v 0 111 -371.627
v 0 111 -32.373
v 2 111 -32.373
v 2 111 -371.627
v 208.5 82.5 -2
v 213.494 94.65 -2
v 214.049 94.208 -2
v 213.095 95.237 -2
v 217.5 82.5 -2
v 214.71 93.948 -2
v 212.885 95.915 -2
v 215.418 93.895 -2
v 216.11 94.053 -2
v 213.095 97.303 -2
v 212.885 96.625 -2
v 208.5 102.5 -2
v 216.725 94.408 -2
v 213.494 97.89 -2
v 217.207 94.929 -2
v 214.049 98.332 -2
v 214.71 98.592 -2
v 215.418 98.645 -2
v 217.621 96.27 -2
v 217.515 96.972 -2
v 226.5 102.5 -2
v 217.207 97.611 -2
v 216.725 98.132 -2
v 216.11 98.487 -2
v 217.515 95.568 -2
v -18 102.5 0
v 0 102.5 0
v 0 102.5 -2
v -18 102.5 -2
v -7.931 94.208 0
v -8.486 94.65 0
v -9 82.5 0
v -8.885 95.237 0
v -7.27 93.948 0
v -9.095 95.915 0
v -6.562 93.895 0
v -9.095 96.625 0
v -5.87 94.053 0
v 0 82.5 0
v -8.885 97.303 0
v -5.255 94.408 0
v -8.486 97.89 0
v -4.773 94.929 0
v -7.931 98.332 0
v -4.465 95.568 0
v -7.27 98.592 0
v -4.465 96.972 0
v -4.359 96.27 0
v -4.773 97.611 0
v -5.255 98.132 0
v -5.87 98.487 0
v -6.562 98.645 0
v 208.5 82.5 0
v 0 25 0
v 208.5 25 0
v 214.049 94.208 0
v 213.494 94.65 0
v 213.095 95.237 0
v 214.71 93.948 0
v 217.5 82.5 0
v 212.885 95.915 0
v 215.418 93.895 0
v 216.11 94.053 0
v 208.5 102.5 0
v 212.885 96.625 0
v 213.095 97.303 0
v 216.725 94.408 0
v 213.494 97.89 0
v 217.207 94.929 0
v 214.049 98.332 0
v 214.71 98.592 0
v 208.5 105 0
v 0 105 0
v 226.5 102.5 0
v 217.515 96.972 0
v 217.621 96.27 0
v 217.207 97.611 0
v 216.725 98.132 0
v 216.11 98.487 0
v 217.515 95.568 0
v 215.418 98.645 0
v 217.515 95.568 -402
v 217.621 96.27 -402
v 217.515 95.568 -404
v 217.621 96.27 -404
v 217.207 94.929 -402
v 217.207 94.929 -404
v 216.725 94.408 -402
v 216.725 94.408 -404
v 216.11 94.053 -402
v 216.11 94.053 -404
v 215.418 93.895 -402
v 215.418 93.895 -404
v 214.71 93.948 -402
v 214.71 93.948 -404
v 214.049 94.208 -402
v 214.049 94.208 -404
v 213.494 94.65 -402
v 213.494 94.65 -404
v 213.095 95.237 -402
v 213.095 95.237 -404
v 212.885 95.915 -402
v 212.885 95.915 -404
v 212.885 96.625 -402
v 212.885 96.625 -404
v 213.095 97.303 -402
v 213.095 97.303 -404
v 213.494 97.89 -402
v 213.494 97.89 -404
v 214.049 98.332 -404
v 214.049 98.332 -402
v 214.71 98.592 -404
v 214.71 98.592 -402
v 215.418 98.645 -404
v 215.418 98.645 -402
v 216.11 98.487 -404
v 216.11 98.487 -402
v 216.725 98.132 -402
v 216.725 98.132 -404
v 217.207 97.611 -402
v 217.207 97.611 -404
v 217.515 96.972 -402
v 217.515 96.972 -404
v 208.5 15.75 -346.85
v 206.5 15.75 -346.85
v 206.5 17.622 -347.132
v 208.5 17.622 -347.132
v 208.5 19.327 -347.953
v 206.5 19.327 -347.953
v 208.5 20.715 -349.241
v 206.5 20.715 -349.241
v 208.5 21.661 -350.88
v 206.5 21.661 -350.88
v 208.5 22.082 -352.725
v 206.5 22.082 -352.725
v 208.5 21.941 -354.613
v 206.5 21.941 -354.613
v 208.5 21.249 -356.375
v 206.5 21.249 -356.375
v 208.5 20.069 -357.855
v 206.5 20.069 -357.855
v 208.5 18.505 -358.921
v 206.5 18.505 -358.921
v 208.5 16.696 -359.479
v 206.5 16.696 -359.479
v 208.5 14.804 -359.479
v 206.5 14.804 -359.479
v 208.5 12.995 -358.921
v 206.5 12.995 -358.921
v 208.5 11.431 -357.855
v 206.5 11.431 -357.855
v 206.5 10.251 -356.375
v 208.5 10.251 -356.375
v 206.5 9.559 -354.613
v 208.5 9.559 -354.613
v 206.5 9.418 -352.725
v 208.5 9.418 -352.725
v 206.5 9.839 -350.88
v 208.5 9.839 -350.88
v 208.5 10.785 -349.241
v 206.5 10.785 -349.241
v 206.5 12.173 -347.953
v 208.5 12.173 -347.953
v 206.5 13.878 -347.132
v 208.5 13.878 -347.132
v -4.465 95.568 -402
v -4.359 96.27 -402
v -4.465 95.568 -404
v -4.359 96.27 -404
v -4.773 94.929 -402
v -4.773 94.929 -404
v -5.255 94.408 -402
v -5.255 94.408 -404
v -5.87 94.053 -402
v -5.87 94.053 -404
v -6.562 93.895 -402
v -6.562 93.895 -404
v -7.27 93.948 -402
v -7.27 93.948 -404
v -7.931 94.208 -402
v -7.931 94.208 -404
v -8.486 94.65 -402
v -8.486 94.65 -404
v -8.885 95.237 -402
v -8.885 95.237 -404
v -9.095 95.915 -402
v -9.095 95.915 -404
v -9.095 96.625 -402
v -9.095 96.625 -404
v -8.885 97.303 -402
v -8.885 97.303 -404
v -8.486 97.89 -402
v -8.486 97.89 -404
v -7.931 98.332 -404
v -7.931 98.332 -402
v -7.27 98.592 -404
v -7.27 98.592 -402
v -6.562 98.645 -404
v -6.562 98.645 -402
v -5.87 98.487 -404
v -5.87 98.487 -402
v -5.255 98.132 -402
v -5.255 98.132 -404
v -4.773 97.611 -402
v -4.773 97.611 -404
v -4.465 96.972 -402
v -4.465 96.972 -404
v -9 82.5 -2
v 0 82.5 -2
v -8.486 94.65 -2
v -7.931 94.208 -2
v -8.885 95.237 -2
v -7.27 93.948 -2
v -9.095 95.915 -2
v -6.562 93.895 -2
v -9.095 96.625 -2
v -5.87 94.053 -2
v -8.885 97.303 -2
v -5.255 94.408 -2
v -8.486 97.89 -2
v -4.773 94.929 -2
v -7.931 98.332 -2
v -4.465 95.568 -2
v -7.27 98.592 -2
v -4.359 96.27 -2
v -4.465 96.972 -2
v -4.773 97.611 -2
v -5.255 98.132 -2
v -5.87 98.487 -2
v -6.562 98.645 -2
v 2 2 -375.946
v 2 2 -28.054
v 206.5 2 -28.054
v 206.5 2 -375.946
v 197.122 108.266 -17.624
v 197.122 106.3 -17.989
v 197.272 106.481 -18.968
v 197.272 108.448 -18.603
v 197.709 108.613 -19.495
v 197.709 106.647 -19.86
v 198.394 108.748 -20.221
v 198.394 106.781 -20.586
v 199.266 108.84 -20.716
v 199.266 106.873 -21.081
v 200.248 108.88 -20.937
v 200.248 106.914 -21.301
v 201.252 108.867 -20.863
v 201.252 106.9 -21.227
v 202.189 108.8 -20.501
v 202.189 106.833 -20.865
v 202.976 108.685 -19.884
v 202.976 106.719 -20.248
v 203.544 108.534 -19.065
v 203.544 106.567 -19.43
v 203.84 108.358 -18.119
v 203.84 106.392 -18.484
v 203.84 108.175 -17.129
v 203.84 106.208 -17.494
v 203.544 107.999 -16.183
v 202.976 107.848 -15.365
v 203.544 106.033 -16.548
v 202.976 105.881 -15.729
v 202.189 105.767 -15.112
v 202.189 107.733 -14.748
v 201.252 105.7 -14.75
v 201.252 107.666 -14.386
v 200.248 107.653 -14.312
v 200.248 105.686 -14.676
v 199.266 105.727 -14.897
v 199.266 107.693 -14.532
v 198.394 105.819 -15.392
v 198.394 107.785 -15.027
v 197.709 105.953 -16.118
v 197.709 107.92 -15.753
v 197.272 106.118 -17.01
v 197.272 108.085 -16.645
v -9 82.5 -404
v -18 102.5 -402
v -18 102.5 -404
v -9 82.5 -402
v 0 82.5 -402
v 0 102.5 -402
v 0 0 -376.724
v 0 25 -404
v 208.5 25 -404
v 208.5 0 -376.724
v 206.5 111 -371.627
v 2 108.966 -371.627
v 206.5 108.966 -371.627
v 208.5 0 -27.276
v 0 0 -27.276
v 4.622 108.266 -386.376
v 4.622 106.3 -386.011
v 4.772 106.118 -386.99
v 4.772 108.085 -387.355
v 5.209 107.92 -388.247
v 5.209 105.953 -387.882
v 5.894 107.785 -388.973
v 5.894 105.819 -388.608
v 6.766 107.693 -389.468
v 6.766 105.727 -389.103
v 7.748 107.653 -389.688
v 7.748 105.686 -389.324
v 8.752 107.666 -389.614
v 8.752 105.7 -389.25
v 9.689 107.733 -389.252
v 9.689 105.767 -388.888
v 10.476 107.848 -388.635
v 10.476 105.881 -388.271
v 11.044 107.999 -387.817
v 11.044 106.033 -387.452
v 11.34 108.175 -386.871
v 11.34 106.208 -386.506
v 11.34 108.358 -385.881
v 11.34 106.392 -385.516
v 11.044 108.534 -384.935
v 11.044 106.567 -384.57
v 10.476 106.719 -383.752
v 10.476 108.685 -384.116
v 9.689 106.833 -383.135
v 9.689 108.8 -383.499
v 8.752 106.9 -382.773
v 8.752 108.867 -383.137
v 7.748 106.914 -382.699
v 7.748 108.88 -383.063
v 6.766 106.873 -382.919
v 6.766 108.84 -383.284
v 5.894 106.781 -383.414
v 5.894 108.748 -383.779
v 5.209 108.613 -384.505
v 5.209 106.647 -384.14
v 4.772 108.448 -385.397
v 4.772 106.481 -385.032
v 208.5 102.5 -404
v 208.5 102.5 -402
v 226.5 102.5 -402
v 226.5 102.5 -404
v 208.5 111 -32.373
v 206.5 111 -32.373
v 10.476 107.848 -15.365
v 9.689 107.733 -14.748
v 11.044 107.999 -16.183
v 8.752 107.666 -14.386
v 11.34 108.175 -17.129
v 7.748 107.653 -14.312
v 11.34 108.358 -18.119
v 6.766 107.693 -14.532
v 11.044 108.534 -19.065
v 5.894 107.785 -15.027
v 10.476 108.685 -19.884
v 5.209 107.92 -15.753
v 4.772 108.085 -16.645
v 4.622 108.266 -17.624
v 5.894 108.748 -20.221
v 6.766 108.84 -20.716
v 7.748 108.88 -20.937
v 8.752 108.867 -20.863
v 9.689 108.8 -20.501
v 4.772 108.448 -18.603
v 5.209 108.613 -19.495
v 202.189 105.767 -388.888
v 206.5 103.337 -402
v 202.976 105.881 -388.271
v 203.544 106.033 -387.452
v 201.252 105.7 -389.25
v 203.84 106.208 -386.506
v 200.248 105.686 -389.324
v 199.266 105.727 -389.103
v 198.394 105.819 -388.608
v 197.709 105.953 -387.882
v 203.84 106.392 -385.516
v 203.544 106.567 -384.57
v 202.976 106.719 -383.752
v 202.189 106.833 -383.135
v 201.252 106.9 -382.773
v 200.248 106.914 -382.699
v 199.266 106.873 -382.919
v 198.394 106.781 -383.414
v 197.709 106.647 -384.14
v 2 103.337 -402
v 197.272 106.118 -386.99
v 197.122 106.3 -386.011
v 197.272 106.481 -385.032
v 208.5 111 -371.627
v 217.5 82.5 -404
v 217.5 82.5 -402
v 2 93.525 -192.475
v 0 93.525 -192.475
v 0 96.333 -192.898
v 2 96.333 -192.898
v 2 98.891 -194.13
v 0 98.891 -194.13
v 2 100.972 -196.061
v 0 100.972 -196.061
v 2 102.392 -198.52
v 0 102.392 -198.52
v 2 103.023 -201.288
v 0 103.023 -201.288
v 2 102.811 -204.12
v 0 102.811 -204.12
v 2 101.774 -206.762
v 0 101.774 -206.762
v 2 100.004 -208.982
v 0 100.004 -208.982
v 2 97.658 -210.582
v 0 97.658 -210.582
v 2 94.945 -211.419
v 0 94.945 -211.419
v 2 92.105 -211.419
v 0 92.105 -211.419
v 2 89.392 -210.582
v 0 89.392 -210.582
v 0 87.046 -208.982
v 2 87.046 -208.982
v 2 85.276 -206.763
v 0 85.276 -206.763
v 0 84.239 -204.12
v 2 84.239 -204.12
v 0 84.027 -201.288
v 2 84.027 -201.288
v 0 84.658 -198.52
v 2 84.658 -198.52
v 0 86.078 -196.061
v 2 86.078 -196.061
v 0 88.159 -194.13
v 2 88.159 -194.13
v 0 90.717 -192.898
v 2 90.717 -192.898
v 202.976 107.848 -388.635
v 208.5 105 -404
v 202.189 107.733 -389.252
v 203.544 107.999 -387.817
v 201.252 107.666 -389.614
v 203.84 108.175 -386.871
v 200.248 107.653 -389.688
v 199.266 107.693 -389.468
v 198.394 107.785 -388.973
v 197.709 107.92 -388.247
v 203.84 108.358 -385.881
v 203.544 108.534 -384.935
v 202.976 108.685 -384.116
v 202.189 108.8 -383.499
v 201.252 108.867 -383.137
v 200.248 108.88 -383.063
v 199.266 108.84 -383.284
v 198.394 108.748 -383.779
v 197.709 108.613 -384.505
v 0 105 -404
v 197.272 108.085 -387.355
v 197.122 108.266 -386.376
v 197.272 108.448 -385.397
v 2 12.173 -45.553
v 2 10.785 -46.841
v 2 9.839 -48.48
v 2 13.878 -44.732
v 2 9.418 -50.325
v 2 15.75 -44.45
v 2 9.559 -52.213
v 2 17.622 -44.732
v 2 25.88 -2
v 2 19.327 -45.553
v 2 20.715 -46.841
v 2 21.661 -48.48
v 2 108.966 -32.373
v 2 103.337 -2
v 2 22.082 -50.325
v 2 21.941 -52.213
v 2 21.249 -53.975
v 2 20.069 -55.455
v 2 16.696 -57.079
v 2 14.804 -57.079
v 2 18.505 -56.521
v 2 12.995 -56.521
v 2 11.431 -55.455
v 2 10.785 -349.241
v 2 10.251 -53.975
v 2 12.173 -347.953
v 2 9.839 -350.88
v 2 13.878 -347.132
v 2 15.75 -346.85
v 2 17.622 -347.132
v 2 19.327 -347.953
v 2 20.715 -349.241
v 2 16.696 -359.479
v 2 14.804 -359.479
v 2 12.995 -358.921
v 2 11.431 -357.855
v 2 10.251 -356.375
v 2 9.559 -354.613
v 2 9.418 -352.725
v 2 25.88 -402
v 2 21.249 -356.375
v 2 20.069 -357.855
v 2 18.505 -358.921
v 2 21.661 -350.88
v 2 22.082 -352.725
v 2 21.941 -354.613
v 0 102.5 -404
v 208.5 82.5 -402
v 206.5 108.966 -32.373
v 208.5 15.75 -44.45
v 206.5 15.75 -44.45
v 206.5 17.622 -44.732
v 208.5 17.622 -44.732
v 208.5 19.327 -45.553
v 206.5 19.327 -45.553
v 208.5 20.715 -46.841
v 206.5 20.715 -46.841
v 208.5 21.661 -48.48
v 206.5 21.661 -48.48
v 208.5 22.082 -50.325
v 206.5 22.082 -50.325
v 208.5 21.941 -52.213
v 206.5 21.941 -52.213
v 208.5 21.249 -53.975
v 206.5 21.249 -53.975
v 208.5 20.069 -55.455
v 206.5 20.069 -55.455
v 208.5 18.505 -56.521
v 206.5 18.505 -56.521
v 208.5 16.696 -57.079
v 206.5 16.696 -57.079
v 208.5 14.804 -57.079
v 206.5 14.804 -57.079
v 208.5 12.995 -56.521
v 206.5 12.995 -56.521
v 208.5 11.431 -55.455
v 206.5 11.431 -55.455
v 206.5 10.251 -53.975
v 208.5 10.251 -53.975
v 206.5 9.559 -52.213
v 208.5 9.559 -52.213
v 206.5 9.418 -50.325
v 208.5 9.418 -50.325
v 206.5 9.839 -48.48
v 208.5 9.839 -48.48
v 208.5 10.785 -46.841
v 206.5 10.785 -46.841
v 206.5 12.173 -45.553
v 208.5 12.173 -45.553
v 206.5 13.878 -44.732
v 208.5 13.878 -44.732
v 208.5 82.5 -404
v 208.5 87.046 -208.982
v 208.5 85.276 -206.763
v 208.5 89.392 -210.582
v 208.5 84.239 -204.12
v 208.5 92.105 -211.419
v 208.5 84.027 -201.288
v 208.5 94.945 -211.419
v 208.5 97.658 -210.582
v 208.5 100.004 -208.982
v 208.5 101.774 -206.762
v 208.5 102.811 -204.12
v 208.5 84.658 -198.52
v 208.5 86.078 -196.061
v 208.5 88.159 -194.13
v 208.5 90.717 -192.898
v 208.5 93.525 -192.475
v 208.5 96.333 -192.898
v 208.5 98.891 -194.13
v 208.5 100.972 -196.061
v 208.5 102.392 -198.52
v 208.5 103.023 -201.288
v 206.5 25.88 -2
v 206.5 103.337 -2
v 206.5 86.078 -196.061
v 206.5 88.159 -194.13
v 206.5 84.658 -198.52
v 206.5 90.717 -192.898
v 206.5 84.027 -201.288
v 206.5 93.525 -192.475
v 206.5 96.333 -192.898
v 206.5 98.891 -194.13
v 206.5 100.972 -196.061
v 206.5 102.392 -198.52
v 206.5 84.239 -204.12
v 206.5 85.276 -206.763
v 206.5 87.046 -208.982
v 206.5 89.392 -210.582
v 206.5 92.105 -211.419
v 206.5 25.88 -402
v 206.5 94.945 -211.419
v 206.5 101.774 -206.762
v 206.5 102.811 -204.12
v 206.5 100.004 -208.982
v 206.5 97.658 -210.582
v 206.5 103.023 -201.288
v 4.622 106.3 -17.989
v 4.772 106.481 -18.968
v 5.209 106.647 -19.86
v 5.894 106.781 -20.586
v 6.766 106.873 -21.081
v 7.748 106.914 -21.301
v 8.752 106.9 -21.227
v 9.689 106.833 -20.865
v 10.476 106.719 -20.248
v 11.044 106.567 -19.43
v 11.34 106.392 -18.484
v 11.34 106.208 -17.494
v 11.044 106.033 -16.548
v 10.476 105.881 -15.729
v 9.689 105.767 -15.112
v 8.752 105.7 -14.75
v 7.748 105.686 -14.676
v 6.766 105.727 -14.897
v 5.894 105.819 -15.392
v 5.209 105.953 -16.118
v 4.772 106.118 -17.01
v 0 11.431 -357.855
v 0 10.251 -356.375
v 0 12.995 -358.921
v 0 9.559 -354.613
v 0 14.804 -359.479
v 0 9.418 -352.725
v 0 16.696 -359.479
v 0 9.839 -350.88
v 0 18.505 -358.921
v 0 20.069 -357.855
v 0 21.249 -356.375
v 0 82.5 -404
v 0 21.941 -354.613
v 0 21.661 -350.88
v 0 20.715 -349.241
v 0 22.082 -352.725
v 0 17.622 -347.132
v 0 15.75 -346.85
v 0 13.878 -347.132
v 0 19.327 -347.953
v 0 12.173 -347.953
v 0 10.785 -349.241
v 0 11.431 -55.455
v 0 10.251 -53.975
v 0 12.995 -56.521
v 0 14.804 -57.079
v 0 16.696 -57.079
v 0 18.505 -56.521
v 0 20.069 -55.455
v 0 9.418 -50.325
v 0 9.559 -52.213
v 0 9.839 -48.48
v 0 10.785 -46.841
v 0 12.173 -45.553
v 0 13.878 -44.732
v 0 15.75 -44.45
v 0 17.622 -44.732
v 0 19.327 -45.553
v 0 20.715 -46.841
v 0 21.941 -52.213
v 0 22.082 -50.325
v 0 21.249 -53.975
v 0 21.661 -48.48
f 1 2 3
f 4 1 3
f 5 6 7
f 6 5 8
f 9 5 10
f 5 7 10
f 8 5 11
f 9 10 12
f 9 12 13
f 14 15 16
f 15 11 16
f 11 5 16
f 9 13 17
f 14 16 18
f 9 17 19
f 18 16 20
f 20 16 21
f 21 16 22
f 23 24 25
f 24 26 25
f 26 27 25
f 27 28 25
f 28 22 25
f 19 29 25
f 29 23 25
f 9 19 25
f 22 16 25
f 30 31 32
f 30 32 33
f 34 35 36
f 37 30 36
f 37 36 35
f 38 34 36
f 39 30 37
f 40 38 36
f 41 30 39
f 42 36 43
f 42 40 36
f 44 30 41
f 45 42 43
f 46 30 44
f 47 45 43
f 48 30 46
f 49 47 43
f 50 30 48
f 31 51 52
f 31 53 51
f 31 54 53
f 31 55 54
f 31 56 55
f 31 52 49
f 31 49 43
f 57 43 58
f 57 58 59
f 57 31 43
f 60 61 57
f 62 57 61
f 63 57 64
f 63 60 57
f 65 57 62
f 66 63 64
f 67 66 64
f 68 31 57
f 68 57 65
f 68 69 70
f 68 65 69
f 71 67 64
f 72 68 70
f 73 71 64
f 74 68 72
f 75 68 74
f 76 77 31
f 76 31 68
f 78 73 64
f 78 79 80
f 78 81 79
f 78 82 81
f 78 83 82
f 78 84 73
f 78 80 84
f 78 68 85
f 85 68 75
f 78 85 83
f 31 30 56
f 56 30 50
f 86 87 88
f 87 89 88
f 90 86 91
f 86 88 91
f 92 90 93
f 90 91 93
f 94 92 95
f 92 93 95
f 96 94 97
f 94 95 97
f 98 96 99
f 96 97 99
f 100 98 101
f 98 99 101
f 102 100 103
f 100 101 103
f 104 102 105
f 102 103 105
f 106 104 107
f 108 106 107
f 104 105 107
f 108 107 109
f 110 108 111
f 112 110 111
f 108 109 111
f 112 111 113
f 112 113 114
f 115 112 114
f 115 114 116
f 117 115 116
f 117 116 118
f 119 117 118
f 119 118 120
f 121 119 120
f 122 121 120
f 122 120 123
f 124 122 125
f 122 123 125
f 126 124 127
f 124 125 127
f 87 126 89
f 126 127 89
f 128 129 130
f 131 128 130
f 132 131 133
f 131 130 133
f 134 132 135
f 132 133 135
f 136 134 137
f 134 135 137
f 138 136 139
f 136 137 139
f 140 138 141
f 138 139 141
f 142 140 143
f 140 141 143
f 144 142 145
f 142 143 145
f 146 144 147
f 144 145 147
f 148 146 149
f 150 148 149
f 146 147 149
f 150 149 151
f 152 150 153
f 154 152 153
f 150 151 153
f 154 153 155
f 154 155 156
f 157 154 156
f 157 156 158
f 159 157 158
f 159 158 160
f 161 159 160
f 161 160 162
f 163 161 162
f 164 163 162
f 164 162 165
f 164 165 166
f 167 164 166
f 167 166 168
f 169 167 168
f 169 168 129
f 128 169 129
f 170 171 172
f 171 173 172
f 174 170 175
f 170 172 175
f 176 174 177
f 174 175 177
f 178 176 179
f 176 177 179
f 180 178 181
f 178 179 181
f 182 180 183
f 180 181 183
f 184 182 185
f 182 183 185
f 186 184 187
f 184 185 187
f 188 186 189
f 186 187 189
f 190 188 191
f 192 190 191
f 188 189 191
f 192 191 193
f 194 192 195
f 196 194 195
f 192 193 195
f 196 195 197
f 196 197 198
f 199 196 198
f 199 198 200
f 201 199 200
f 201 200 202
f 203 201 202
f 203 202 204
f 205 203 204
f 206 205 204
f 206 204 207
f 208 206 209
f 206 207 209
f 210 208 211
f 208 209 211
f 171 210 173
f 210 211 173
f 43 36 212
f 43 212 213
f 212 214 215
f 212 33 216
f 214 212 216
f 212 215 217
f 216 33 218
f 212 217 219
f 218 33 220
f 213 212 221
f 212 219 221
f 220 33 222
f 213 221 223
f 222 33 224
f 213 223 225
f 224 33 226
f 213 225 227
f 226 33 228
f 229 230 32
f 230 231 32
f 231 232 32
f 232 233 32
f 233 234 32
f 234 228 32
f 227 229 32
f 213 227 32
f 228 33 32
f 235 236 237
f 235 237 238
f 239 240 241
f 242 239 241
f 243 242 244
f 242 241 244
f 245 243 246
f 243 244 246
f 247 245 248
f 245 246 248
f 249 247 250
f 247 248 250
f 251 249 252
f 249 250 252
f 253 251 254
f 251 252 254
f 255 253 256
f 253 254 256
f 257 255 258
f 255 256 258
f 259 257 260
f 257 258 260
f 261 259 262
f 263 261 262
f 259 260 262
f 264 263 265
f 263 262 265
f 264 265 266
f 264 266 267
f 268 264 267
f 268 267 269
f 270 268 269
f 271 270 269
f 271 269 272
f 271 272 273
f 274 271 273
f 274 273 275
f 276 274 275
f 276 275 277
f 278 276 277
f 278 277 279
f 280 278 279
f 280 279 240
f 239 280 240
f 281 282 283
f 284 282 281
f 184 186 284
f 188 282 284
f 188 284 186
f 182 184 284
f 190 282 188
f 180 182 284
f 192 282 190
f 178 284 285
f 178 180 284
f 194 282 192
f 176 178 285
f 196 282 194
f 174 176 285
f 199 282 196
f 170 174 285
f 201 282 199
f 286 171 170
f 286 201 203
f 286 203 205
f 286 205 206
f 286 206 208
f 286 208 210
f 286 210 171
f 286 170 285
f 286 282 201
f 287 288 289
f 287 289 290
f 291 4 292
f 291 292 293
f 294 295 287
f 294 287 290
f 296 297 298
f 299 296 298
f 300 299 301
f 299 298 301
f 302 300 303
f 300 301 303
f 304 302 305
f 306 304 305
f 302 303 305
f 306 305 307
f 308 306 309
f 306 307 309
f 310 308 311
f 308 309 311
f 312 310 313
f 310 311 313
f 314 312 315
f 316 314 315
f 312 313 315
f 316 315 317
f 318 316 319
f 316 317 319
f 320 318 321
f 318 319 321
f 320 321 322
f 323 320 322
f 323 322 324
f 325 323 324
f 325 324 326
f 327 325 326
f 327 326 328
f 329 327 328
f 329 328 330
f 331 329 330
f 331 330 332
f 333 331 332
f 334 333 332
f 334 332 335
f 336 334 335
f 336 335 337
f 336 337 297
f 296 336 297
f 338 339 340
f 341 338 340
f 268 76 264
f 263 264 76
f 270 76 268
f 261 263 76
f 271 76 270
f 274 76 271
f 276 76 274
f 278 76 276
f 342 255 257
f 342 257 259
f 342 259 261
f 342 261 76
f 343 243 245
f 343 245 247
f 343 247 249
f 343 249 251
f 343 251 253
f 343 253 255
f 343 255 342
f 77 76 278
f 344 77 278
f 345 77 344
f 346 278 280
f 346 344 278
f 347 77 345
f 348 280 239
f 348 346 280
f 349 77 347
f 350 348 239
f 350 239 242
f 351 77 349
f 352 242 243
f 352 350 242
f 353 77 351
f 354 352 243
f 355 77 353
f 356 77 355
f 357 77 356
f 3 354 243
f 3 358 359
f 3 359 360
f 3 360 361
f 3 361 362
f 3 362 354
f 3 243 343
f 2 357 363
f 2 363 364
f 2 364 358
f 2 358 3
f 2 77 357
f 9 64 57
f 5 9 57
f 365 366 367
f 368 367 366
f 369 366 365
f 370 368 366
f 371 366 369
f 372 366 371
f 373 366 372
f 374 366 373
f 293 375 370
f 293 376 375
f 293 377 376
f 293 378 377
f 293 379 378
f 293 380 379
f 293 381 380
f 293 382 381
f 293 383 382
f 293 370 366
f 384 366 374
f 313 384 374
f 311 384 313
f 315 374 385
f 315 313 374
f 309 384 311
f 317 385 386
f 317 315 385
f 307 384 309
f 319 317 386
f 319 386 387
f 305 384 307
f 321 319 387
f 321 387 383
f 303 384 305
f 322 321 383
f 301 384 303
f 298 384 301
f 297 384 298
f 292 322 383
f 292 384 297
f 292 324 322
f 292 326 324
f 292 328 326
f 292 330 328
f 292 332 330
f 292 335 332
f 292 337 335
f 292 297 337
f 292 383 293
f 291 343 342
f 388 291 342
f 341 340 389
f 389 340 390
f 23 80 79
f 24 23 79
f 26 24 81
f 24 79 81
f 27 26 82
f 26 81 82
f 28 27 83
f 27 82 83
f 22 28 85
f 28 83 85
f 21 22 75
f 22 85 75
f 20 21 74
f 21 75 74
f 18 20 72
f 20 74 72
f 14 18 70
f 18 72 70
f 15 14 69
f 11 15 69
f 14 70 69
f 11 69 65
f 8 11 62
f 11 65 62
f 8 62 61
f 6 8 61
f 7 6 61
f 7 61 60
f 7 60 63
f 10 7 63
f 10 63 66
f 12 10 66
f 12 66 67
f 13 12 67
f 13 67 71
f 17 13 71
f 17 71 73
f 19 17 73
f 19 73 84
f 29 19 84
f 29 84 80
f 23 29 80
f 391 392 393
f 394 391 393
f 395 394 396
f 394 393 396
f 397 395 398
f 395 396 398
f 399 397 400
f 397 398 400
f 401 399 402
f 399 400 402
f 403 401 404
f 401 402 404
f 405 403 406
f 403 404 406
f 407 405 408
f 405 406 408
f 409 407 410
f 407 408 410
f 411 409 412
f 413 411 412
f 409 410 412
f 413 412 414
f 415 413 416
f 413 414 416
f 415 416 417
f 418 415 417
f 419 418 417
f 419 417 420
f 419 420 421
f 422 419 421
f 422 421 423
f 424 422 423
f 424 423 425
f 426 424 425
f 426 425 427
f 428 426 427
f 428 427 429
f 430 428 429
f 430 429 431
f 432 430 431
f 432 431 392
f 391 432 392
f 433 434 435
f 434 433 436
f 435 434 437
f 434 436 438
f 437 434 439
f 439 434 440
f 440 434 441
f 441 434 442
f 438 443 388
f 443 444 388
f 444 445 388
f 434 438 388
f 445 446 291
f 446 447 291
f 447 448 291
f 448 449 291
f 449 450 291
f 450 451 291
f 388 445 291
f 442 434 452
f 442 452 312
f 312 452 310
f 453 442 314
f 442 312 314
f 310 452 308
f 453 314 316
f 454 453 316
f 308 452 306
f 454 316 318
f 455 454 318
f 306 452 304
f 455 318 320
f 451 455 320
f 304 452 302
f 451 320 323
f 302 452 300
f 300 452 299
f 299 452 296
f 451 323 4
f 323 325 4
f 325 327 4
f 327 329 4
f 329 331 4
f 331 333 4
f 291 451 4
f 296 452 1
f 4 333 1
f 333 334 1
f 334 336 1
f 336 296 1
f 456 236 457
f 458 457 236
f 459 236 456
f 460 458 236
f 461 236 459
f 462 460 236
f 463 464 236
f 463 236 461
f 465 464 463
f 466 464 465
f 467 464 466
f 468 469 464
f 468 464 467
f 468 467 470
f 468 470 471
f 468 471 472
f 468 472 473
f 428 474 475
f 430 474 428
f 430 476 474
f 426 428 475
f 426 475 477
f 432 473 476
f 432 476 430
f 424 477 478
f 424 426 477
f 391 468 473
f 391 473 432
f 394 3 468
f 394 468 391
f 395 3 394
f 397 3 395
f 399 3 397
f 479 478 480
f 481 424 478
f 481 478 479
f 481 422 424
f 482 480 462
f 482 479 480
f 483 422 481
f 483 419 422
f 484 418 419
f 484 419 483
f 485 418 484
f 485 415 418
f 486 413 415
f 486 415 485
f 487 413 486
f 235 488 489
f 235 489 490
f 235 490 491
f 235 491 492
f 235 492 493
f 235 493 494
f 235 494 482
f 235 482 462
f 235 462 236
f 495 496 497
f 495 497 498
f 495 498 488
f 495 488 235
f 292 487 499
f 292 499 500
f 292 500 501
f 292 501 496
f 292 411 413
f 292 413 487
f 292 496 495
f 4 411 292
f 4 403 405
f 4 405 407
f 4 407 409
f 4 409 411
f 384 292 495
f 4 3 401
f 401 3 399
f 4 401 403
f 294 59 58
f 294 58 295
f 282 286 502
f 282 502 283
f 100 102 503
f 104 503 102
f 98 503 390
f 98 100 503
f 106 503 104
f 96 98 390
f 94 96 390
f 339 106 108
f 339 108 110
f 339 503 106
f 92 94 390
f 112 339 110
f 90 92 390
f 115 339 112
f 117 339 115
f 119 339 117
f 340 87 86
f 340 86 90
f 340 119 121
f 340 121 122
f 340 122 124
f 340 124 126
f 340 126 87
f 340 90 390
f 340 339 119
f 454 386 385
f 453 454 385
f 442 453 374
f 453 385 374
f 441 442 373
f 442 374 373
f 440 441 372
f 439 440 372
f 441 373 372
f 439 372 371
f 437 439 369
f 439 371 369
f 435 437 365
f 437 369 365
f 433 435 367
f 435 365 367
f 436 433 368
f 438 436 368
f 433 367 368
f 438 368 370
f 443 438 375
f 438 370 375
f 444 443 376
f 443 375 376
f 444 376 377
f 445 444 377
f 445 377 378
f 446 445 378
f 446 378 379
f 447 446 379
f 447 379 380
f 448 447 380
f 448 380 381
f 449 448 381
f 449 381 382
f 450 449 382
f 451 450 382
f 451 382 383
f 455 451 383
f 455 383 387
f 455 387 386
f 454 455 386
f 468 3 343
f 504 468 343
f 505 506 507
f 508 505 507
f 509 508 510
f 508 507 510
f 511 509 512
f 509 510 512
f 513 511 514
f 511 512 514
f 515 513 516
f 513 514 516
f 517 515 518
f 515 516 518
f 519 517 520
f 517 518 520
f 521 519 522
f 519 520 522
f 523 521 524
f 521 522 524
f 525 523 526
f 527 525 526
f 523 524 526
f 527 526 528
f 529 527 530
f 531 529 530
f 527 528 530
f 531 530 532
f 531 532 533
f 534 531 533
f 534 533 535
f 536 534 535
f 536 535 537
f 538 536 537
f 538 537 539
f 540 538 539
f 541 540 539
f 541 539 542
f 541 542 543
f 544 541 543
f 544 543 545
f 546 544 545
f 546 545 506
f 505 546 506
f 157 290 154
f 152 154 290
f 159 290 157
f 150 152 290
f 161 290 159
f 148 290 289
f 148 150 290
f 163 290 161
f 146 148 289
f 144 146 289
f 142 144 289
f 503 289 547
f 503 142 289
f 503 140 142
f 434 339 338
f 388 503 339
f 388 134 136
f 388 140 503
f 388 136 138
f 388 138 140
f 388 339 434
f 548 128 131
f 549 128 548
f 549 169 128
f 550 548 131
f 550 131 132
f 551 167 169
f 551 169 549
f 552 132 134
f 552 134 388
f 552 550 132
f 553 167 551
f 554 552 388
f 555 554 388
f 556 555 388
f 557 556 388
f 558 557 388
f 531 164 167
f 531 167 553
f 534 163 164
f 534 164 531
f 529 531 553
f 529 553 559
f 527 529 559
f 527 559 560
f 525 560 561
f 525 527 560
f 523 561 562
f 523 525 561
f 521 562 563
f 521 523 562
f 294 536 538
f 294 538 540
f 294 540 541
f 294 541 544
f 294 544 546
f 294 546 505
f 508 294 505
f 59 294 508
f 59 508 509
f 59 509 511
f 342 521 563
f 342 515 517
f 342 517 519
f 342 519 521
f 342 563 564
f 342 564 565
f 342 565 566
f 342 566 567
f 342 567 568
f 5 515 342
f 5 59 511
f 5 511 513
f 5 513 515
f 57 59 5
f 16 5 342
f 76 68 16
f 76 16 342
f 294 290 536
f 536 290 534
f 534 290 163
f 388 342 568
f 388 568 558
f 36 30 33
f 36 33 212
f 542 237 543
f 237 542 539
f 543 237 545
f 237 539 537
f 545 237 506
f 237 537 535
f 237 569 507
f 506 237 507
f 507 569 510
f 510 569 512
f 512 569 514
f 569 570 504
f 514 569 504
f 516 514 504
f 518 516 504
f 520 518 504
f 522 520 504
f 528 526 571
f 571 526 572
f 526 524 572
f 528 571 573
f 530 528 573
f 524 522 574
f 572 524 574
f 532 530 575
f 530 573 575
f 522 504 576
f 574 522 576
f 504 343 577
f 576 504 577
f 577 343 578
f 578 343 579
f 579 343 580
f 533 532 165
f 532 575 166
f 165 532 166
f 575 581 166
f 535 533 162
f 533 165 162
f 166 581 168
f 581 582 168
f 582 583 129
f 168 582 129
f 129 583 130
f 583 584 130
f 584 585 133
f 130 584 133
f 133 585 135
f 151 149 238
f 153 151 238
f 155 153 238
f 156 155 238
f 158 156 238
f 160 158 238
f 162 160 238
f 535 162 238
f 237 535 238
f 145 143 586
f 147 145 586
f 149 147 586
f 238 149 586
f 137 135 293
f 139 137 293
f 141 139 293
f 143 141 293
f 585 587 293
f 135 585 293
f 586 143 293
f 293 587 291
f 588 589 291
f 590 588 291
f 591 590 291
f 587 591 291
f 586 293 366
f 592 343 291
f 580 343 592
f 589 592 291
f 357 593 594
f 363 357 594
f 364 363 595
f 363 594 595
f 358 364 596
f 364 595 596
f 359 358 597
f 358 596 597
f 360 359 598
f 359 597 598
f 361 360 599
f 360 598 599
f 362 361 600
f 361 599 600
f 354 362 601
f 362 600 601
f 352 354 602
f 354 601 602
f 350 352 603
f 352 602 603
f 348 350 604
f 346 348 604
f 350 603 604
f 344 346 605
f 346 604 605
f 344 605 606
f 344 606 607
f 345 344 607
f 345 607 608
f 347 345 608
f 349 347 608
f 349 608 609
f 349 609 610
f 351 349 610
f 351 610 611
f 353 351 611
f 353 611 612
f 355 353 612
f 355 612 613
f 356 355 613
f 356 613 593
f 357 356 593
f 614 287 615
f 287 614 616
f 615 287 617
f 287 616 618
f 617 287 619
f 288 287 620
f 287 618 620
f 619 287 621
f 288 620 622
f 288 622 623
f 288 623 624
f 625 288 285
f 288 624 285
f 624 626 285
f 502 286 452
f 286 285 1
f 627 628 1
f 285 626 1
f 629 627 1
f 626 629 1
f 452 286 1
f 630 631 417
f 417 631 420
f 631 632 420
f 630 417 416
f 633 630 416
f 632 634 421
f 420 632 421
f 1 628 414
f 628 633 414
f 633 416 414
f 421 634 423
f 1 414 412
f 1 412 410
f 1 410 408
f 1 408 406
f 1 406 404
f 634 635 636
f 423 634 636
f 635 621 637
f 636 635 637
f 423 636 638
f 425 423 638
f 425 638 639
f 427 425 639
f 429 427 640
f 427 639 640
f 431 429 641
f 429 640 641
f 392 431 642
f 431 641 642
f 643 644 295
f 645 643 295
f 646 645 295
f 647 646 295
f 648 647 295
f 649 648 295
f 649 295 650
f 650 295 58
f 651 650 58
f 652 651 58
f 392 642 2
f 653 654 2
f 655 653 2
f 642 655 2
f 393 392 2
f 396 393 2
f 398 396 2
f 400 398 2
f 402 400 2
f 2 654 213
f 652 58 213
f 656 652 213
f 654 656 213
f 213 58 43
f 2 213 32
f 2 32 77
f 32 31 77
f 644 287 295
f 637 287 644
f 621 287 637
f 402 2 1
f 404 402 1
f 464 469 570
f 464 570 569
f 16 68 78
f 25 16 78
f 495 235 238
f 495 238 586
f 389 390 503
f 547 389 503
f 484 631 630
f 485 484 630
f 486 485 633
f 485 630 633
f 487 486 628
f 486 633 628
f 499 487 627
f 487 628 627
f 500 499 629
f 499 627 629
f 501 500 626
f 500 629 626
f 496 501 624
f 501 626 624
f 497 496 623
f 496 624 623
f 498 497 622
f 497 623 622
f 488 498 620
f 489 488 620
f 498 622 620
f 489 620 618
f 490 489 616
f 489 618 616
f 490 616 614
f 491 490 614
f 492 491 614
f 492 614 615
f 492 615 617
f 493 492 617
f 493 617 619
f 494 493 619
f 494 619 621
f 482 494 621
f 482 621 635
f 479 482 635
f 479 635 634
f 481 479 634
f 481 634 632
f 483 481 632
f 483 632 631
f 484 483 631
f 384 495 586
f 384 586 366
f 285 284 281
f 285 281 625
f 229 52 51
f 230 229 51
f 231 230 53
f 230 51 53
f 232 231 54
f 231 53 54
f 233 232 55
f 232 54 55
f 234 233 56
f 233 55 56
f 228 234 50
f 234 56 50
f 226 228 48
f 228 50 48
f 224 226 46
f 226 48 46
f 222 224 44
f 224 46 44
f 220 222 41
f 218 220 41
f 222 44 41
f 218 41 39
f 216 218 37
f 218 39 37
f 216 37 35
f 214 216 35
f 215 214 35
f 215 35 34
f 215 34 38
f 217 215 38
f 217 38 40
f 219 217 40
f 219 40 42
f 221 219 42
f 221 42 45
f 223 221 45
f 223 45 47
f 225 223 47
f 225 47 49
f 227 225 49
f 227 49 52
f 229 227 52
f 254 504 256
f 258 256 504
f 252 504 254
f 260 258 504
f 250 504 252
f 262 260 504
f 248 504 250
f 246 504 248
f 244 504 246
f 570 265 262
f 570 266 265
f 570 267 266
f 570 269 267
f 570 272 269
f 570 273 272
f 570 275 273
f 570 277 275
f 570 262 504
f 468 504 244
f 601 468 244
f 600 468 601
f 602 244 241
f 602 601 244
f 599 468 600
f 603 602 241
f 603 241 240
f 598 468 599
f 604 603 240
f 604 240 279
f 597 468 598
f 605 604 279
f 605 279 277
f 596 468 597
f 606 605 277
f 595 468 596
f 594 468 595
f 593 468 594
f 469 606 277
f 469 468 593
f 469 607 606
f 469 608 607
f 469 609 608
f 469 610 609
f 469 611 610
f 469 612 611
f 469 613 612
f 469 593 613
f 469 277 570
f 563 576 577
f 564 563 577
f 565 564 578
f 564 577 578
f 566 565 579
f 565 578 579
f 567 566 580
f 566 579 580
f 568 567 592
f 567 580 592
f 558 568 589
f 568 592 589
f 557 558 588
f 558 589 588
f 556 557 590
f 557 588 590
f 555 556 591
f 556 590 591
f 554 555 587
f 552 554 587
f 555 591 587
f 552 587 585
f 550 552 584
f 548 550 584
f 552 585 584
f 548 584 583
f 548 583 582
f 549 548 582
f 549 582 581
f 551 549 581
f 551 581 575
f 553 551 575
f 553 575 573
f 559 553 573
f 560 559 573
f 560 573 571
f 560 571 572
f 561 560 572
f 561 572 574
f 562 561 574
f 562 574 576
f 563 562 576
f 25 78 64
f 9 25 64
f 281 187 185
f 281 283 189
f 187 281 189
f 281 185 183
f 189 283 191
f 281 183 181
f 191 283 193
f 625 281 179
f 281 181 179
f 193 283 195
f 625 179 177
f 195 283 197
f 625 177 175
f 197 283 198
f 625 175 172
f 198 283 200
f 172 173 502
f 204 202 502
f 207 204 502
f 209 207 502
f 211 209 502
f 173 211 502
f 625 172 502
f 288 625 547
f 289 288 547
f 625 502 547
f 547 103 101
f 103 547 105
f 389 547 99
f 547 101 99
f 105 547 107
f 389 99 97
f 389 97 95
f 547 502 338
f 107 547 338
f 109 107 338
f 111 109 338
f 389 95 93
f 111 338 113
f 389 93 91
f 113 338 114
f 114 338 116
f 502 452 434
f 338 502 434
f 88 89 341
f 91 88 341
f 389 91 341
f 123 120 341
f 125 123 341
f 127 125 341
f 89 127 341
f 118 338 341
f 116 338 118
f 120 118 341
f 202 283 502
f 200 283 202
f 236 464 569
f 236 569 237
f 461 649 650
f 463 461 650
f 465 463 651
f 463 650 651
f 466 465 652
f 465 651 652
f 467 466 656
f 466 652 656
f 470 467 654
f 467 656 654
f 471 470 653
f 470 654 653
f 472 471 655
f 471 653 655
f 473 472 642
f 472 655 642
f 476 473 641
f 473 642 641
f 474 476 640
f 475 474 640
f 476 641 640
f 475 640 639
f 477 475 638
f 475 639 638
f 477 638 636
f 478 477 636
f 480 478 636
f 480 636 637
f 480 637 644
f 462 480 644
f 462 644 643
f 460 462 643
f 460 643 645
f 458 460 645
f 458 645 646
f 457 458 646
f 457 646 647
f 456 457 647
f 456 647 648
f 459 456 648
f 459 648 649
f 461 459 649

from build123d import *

# Parameters (mm, degrees)
ESQUISSE1_W             = 208.5
ESQUISSE1_H             = 111
BOSS_EXTRU_1_DEPTH      = 404
ESQUISSE3_W             = 18
ESQUISSE3_H             = 400
ENL_V_MAT_EXTRU_2_DEPTH = 475.36747359
ENL_V_MAT_EXTRU_3_DEPTH = 477.276442835
COQUE2_START            = 2
COQUE2_DEPTH            = 204.5
ENL_V_MAT_EXTRU_4_REACH = 478.276
ESQUISSE5_W             = 204.5
ESQUISSE5_H             = 339.253793908
D_GAGEMENT_1_41_D       = 6.7564
D_GAGEMENT_1_41_DEPTH   = 2
D_GAGEMENT_1_42_D       = 6.7564
D_GAGEMENT_1_42_DEPTH   = 2
ESQUISSE10_R            = 9.525
ESQUISSE10_R_2          = 6.35
ENL_V_MAT_EXTRU_5_DEPTH = 477.276442835
ENL_V_MAT_EXTRU_6_REACH = 478.276
ESQUISSE11_R            = 2.38125
ENL_V_MAT_EXTRU_7_REACH = 478.276
ESQUISSE12_R            = 2.38125


# Read off the part's stored shape, not the designer's step: Coque2
with BuildPart() as part:
    # Esquisse1 → Boss.-Extru.1 (new body)
    with BuildSketch(Plane.XY):
        with Locations((104.25, 55.5)):
            Rectangle(ESQUISSE1_W, ESQUISSE1_H)
        Polygon((0, 102.5), (-18, 102.5), (-9, 82.5), (0, 82.5), align=None)
        Polygon((208.5, 102.5), (226.5, 102.5), (217.5, 82.5), (208.5, 82.5), align=None)
    extrude(amount=-BOSS_EXTRU_1_DEPTH)

    # Esquisse3 → Enlèv. mat.-Extru.2 (cut, through all)
    with BuildSketch(Plane(origin=(0, 102.5, 0), x_dir=(1, 0, 0), z_dir=(0, 1, 0))):
        with Locations((-9, 202)):
            Rectangle(ESQUISSE3_W, ESQUISSE3_H)
        with Locations((217.5, 202)):
            Rectangle(ESQUISSE3_W, ESQUISSE3_H)
    extrude(amount=-ENL_V_MAT_EXTRU_2_DEPTH, mode=Mode.SUBTRACT)

    # Esquisse4 → Enlèv. mat.-Extru.3 (cut, through all)
    with BuildSketch(Plane.ZY):
        Polygon((0, 105), (-32.373103046, 111), (0, 111), align=None)
        Polygon((-404, 105), (-371.626896954, 111), (-404, 111), align=None)
        Polygon((0, 25), (-27.276363394, 0), (0, 0), align=None)
        Polygon((-404, 25), (-376.723636606, 0), (-404, 0), align=None)
    extrude(amount=-ENL_V_MAT_EXTRU_3_DEPTH, mode=Mode.SUBTRACT)

    # Coque2 outline → Coque2 (cut)
    with BuildSketch(Plane.YZ.offset(COQUE2_START)):
        Polygon((25.87988269, -402), (103.336617558, -402), (109, -371.443122771), (109, -32.556877229), (103.336617558, -2), (25.87988269, -2), (2, -28.054254322), (2, -375.945745678), align=None)
    extrude(amount=COQUE2_DEPTH, mode=Mode.SUBTRACT)

    # Esquisse5 → Enlèv. mat.-Extru.4 (cut, up to next)
    with BuildSketch(Plane(origin=(0, 111, 0), x_dir=(1, 0, 0), z_dir=(0, 1, 0)), mode=Mode.PRIVATE) as enl_v_mat_extru_4_sk1:
        with Locations((104.25, 202)):
            Rectangle(ESQUISSE5_W, ESQUISSE5_H)
    enl_v_mat_extru_4_tool1 = extrude(enl_v_mat_extru_4_sk1.sketch, amount=-ENL_V_MAT_EXTRU_4_REACH, mode=Mode.PRIVATE) & part.part
    add(enl_v_mat_extru_4_tool1.solids().sort_by_distance((104.25, 111, -202))[0], mode=Mode.SUBTRACT)

    # Dégagement 1/41
    with Locations(Plane(origin=(0, 101.512972391, 18.814317351), x_dir=(1, 0, 0), z_dir=(0, 0.983254907563956, 0.18223552549214056))):
        with Locations((8, 37.059155773), (200.5, 37.059155773)):
            Hole(D_GAGEMENT_1_41_D / 2, depth=D_GAGEMENT_1_41_DEPTH)

    # Dégagement 1/42
    with Locations(Plane(origin=(0, 173.903298199, -32.231071199), x_dir=(1, 0, 0), z_dir=(0, 0.983254907563956, -0.18223552549214078))):
        with Locations((8, 360.175826883), (200.5, 360.175826883)):
            Hole(D_GAGEMENT_1_42_D / 2, depth=D_GAGEMENT_1_42_DEPTH)

    # Esquisse10 → Enlèv. mat.-Extru.5 (cut, through all)
    with BuildSketch(Plane.ZY):
        with Locations((-202, 93.525)):
            Circle(ESQUISSE10_R)
        with Locations((-353.2, 15.75)):
            Circle(ESQUISSE10_R_2)
        with Locations((-50.8, 15.75)):
            Circle(ESQUISSE10_R_2)
    extrude(amount=-ENL_V_MAT_EXTRU_5_DEPTH, mode=Mode.SUBTRACT)

    # Esquisse11 → Enlèv. mat.-Extru.6 (cut, up to next)
    with BuildSketch(Plane.XY, mode=Mode.PRIVATE) as enl_v_mat_extru_6_sk1:
        with Locations((-6.74, 96.27)):
            Circle(ESQUISSE11_R)
    enl_v_mat_extru_6_tool1 = extrude(enl_v_mat_extru_6_sk1.sketch, amount=-ENL_V_MAT_EXTRU_6_REACH, mode=Mode.PRIVATE) & part.part
    # Esquisse11 → Enlèv. mat.-Extru.6 (cut, up to next)
    with BuildSketch(Plane.XY, mode=Mode.PRIVATE) as enl_v_mat_extru_6_sk2:
        with Locations((215.24, 96.27)):
            Circle(ESQUISSE11_R)
    enl_v_mat_extru_6_tool2 = extrude(enl_v_mat_extru_6_sk2.sketch, amount=-ENL_V_MAT_EXTRU_6_REACH, mode=Mode.PRIVATE) & part.part
    add(enl_v_mat_extru_6_tool1.solids().sort_by_distance((-6.74, 96.27, 0))[0], mode=Mode.SUBTRACT)
    add(enl_v_mat_extru_6_tool2.solids().sort_by_distance((215.24, 96.27, 0))[0], mode=Mode.SUBTRACT)

    # Esquisse12 → Enlèv. mat.-Extru.7 (cut, up to next)
    with BuildSketch(Plane(origin=(0, 0, -404), x_dir=(-1, 0, 0), z_dir=(0, 0, -1)), mode=Mode.PRIVATE) as enl_v_mat_extru_7_sk1:
        with Locations(Location((-215.24, 96.27, 0), (0, 0, 180))):
            Circle(ESQUISSE12_R)
    enl_v_mat_extru_7_tool1 = extrude(enl_v_mat_extru_7_sk1.sketch, amount=-ENL_V_MAT_EXTRU_7_REACH, mode=Mode.PRIVATE) & part.part
    # Esquisse12 → Enlèv. mat.-Extru.7 (cut, up to next)
    with BuildSketch(Plane(origin=(0, 0, -404), x_dir=(-1, 0, 0), z_dir=(0, 0, -1)), mode=Mode.PRIVATE) as enl_v_mat_extru_7_sk2:
        with Locations(Location((6.74, 96.27, 0), (0, 0, 180))):
            Circle(ESQUISSE12_R)
    enl_v_mat_extru_7_tool2 = extrude(enl_v_mat_extru_7_sk2.sketch, amount=-ENL_V_MAT_EXTRU_7_REACH, mode=Mode.PRIVATE) & part.part
    add(enl_v_mat_extru_7_tool1.solids().sort_by_distance((215.24, 96.27, -404))[0], mode=Mode.SUBTRACT)
    add(enl_v_mat_extru_7_tool2.solids().sort_by_distance((-6.74, 96.27, -404))[0], mode=Mode.SUBTRACT)


solid = part.part
